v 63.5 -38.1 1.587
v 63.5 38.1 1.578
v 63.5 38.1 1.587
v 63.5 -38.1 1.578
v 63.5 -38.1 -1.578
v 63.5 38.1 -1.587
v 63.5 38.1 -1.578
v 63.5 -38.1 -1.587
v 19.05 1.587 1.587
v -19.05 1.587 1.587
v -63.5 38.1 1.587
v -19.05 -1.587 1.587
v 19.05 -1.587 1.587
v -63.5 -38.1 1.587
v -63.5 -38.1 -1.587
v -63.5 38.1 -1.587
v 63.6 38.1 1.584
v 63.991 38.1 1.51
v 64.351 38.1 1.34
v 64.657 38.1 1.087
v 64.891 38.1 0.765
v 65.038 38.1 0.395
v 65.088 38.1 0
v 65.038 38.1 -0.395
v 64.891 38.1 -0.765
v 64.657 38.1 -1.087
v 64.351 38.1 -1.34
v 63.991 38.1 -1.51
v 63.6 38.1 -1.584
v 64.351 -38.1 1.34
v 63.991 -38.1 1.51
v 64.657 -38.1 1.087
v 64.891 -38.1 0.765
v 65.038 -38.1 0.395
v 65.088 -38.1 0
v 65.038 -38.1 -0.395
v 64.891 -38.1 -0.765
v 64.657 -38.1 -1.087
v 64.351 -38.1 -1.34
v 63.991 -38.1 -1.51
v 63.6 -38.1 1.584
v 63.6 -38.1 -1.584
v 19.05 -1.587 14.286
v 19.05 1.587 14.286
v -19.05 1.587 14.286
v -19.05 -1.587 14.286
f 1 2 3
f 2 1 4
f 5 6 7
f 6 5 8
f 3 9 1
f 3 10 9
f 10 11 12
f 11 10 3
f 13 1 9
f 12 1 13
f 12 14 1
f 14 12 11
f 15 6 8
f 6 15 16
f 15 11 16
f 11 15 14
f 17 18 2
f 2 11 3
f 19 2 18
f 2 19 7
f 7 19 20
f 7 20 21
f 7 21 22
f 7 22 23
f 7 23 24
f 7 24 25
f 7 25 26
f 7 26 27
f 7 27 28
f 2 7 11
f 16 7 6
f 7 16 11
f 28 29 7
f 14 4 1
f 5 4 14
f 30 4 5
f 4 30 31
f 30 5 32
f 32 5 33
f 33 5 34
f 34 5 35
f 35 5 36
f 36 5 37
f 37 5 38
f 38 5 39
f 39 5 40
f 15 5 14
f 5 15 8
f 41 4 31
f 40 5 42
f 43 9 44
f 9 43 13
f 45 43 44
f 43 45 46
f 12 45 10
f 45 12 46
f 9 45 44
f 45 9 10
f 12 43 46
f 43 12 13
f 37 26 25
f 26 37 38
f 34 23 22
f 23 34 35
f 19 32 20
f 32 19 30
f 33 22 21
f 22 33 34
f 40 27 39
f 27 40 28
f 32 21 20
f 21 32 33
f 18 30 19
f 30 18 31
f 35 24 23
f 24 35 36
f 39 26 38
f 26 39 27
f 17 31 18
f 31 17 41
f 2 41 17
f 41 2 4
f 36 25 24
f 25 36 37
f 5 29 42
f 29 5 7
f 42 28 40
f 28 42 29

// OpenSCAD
$fa = 1;
$fs = 0.4;

scale_factor = 25.4;
nudge = 0.001;

base_width = 5 * scale_factor;
base_depth = 3 * scale_factor;
base_height = 0.125 * scale_factor;

fin_width = 1.5 * scale_factor;
fin_depth = 0.125 * scale_factor;
fin_height = 0.5 * scale_factor;

bevel_cylinder_translate_x = (base_width / 2) * 1;
bevel_cylinder_translate_y = 0;
bevel_cylinder_translate_z = 0;
bevel_cylinder_height = base_depth;
bevel_cylinder_radius = base_height / 2;

union() {
    union() {
        // Base
        translate([0, 0, 0])
        rotate([0, 0, 0])
        cube([base_width, base_depth, base_height], center = true);

        // Fin
        translate([0, 0, abs((base_height / 2) + (fin_height / 2) - nudge)])
        rotate([0, 0, 0])
        cube([fin_width, fin_depth, fin_height], center = true);
    }
    // Bevel
    translate([bevel_cylinder_translate_x, bevel_cylinder_translate_y, bevel_cylinder_translate_z])
    rotate([90,0,0])
    cylinder(h = bevel_cylinder_height, r = bevel_cylinder_radius, center = true);
}

// elongate fin and add gripping cylinder?
//translate([0, 0, 40])
//rotate([90, 0, 0])
//cylinder(h = base_depth, r = 5, center = true);
